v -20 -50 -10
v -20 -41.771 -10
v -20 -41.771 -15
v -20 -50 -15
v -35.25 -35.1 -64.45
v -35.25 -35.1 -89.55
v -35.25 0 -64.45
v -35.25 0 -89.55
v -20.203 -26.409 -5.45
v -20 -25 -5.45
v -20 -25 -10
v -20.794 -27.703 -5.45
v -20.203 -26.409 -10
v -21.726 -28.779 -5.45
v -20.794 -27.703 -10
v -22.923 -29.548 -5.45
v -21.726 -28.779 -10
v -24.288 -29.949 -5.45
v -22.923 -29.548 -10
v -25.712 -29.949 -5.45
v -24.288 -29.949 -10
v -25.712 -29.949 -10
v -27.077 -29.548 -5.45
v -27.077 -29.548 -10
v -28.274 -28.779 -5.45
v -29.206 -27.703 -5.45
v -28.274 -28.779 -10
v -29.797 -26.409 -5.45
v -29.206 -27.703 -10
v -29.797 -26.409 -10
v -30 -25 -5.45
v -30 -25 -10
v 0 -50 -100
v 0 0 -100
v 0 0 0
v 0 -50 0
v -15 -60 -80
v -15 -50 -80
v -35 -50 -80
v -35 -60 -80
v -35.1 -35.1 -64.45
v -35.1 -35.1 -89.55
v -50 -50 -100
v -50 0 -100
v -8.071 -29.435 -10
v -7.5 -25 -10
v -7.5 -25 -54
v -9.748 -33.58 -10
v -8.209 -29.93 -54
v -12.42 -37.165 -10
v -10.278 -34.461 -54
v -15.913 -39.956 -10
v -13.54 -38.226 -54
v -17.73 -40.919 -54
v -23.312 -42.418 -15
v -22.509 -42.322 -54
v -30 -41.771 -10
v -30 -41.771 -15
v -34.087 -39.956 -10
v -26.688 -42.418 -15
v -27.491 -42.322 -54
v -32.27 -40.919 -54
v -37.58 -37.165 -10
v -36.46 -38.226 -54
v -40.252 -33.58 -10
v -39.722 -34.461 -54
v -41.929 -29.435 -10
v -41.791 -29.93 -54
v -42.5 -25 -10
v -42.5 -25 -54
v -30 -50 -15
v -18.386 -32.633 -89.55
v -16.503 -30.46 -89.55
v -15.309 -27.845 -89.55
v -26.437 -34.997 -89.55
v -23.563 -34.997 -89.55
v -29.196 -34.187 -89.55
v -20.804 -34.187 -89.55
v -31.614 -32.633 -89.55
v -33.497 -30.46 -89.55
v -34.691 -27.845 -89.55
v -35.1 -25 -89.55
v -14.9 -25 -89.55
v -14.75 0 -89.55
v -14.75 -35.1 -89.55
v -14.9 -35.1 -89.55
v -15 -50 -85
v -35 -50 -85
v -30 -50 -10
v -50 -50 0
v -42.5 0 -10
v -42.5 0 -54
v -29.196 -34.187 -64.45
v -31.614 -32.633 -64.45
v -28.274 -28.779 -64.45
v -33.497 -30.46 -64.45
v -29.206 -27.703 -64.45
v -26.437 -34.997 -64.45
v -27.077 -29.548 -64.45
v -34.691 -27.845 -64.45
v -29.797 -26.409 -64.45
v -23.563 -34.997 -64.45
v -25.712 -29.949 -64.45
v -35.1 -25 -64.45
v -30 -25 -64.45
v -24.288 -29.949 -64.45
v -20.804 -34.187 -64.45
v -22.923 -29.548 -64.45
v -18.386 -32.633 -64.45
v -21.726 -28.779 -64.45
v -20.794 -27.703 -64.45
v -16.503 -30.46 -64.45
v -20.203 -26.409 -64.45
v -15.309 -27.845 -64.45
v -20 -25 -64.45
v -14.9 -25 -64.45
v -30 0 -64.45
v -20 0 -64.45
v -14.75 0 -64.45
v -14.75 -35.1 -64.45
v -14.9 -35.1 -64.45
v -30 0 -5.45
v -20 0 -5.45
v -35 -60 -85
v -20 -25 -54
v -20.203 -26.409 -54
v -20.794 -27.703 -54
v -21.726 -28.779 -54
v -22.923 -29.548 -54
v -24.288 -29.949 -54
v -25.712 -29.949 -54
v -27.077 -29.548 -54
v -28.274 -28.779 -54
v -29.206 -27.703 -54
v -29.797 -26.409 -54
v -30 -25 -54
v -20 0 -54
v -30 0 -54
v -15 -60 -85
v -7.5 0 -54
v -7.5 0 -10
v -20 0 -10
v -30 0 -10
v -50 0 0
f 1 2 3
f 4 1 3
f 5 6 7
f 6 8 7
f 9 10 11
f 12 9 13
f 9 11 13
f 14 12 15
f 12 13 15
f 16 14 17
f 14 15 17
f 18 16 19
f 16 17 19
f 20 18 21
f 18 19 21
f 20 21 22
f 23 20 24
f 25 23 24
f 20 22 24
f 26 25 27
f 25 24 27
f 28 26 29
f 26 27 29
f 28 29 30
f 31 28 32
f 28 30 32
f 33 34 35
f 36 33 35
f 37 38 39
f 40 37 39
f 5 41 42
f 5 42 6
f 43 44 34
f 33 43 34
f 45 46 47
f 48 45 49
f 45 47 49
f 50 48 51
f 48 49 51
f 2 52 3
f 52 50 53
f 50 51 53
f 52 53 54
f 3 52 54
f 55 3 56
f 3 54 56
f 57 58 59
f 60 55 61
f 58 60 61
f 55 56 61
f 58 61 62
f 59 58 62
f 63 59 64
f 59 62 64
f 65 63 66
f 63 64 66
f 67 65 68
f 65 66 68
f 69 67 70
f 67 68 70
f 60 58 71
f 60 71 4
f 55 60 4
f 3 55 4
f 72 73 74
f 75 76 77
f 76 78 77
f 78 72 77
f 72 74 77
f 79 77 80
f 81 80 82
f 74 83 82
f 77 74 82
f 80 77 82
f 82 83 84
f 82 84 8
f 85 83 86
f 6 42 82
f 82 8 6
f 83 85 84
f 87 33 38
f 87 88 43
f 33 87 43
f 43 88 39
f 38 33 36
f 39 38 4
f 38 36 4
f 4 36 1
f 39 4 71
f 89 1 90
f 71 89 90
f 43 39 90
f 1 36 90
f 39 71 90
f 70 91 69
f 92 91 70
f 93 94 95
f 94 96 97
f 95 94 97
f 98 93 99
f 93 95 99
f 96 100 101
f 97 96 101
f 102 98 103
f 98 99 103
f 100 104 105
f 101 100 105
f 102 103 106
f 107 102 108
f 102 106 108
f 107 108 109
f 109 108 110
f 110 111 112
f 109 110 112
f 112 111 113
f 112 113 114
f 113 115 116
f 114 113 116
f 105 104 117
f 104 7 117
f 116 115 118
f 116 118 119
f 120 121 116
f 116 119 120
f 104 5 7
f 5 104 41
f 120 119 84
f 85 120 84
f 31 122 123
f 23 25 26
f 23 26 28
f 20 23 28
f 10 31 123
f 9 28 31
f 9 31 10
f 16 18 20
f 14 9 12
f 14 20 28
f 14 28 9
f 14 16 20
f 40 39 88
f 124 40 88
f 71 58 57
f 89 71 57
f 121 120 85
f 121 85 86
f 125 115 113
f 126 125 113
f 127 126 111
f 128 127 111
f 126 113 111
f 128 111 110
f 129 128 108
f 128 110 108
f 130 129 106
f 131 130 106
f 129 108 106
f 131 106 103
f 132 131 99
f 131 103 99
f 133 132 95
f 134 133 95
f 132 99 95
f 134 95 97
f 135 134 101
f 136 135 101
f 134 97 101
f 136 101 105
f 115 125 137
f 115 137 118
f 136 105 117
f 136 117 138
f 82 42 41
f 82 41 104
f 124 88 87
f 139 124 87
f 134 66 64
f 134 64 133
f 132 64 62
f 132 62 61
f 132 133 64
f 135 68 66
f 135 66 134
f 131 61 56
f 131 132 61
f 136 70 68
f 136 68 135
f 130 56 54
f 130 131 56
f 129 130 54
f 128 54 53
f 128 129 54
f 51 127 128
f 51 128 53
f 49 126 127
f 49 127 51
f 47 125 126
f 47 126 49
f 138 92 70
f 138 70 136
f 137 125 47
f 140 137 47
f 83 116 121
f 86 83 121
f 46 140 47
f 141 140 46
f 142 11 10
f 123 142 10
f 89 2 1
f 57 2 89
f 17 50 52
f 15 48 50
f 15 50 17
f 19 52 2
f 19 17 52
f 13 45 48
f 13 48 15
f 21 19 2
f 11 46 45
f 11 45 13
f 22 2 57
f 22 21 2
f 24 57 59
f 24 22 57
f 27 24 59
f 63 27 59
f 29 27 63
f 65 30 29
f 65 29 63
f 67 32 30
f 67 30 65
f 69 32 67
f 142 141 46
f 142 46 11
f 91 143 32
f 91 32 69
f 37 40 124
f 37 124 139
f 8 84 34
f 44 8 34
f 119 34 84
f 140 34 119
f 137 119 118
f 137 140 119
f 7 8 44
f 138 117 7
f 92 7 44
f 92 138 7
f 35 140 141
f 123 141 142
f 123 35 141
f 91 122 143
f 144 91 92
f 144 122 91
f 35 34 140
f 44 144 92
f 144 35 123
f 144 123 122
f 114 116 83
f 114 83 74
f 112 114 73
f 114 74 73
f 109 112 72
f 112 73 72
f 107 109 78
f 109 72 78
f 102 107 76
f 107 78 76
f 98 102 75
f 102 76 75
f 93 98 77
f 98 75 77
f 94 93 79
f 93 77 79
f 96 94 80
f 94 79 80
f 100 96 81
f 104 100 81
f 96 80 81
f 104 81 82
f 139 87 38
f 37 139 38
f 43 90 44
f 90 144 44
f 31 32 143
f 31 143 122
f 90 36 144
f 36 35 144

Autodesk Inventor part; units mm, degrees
sketch "Sketch1" plane through (0, 0, 0) normal (0, 1, 0) x (-1, 0, 0)
  line L0 (0, 0) -> (50, 0)
  line L1 (50, 0) -> (50, -100)
  line L2 (50, -100) -> (0, -100)
  line L3 (0, -100) -> (0, 0)
  line L4 (25, 0) -> (25, -100)
  line L5 (7.5, -54) -> (7.5, -10)
  line L6 (7.5, -10) -> (42.5, -10)
  line L7 (42.5, -10) -> (42.5, -54)
  line L8 (42.5, -54) -> (7.5, -54)
  line L9 (7.5, -54) -> (42.5, -10) construction
  line L10 (7.5, -10) -> (42.5, -54) construction
  line L11 (7.5, -54) -> (51.5, -54) construction
  line L12 (14.75, -64.45) -> (14.75, -89.55)
  line L13 (14.75, -89.55) -> (35.25, -89.55)
  line L14 (35.25, -89.55) -> (35.25, -64.45)
  line L15 (35.25, -64.45) -> (14.75, -64.45)
  line L16 (14.75, -64.45) -> (35.25, -89.55) construction
  line L17 (14.75, -89.55) -> (35.25, -64.45) construction
  line L18 (14.75, -64.45) -> (39.85, -64.45) construction
  line L19 (25, -10) -> (25, -15)
  line L20 (25, -10) -> (30, -10) construction
  line L21 (20, -20) -> (30, -20)
  line L22 (30, -20) -> (30, -10)
  line L23 (30, -10) -> (20, -10)
  line L24 (20, -10) -> (20, -20)
  line L25 (20, -20) -> (30, -10) construction
  line L26 (30, -20) -> (20, -10) construction
  line L27 (20, -20) -> (30, -20) construction
  line L28 (30, -15) -> (20, -15)
  point P0 (25, -32)
  point P1 (25, -77)
  point P2 (25, -54)
  point P3 (25, -77)
  dimension "d0" = 50
  dimension "d1" = 100
  dimension "d4" = 44
  dimension "d5" = 90
  dimension "d6" = 35
  dimension "d7" = 10
  dimension "d8" = 25.1
  dimension "d9" = 90
  dimension "d10" = 20.5
  dimension "d35" = 5
  dimension "d36" = 90
  dimension "d37" = 0
extrude "Extrusion1" add sketch "Sketch1" against normal blind 50
ref_plane "Work Plane3" through (-14.75, 0, -89.55) normal (0, 0, -1) x (-1, 0, 0)
ref_plane "Work Plane4" through (-7.5, 0, -54) normal (0, 0, -1) x (-1, 0, 0)
sketch "Sketch3" plane through (-14.75, 0, -89.55) normal (0, 0, -1) x (-1, 0, 0)
  line L0 (35.25, 0) -> (-14.75, 0) projected
  line L1 (35.25, 0) -> (35.25, -50) projected
  line L2 (-14.75, -50) -> (35.25, -50) projected
  line L3 (-14.75, 0) -> (-14.75, -50) projected
  circle A0 centre (10.25, -25) radius 10.1
  line L4 (20.35, -35.1) -> (20.35, -14.9)
  line L5 (20.35, -14.9) -> (0.15, -14.9)
  line L6 (0.15, -14.9) -> (0.15, -35.1)
  line L7 (0.15, -35.1) -> (20.35, -35.1)
  line L8 (20.35, -35.1) -> (0.15, -14.9) construction
  line L9 (20.35, -14.9) -> (0.15, -35.1) construction
  line L10 (20.35, -35.1) -> (40.55, -35.1) construction
  point P0 (10.25, -35.1)
  point P1 (0.15, -25)
  point P2 (20.35, -25)
  dimension "d18" = 20.2
  dimension "d21" = 90
ref_plane "Work Plane5" through (-14.75, 0, -64.45) normal (0, 0, -1) x (-1, 0, 0)
ref_plane "Work Plane6" through (-7.5, 0, -10) normal (0, 0, -1) x (-1, 0, 0)
ref_plane "Work Plane7" through (-35.1, -35.1, -89.55) normal (0, 1, 0) x (1, 0, 0)
extrude "Extrusion5" cut sketch "Sketch1" against normal up to surface (35.1 mm away) contours L13 L12 L15 L4 | L4 L15 L14 L13
extrude "Extrusion6" add sketch "Sketch3" against normal up to surface (25.1 mm away) contours L4 L7 A0 | L7 L6 A0
sketch "Sketch4" plane through (-7.5, 0, -54) normal (0, 0, -1) x (-1, 0, 0)
  line L0 (42.5, 0) -> (-7.5, 0) projected
  line L1 (42.5, 0) -> (42.5, -50) projected
  line L2 (-7.5, -50) -> (42.5, -50) projected
  line L3 (-7.5, 0) -> (-7.5, -50) projected
  circle A0 centre (17.5, -25) radius 17.5
  line L4 (0, -42.5) -> (0, -7.5)
  line L5 (0, -7.5) -> (35, -7.5)
  line L6 (35, -7.5) -> (35, -42.5)
  line L7 (35, -42.5) -> (0, -42.5)
  line L8 (0, -42.5) -> (35, -7.5) construction
  line L9 (0, -7.5) -> (35, -42.5) construction
  line L10 (0, -42.5) -> (35, -42.5) construction
  point P0 (17.5, -42.5)
  point P1 (35, -25)
  point P2 (0, -25)
  dimension "d26" = 35
  dimension "d27" = 90
ref_plane "Work Plane8" through (-7.5, -42.5, -54) normal (0, 1, 0) x (1, 0, 0)
extrude "Extrusion7" cut sketch "Sketch1" against normal up to surface (42.5 mm away) contours L6 L22 L28 L4 | L4 L28 L24 L6 | L28 L22 L21 L4 | L4 L21 L24 L28 | L24 L21 L4 L8 L5 L6 | L6 L7 L8 L4 L21 L22
extrude "Extrusion8" add sketch "Sketch4" against normal up to surface (44 mm away) contours L6 L7 A0 | L7 L4 A0
sketch "Sketch5" plane through (-14.75, 0, -64.45) normal (0, 0, -1) x (-1, 0, 0)
  line L0 (35.25, 0) -> (-14.75, 0) projected
  line L1 (35.25, 0) -> (35.25, -50) projected
  line L2 (-14.75, -50) -> (35.25, -50) projected
  line L3 (-14.75, 0) -> (-14.75, -50) projected
  circle A0 centre (10.25, -25) radius 5
  dimension "d32" = 10
extrude "Extrusion9" cut sketch "Sketch5" against normal blind 59 contours A0
extrude "Extrusion10" cut sketch "Sketch1" against normal through all contours L6 L22 L28 L4 | L4 L28 L24 L6
ref_plane "Work Plane9" through (-25, -25, -64.45) normal (0, 1, 0) x (1, 0, 0)
sketch "Sketch6" plane through (-25, -25, -64.45) normal (0, 1, 0) x (1, 0, 0)
  line L0 (-5, 0) -> (-5, -10.45) projected
  line L1 (-5, 0) -> (5, 0) projected
  line L2 (5, -10.45) -> (-5, -10.45) projected
  line L3 (5, -10.45) -> (-5, -10.45) projected
  line L4 (-5, -10.45) -> (5, -10.45)
  line L5 (5, -10.45) -> (5, 0)
  line L6 (5, 0) -> (-5, 0)
  line L7 (-5, 0) -> (-5, -10.45)
  line L8 (-5, -59) -> (5, -59) projected
  line L9 (-5, -54.45) -> (-5, -59) projected
  line L10 (5, -54.45) -> (5, -59) projected
  line L11 (-5, -54.45) -> (5, -54.45) projected
  line L12 (5, -54.45) -> (-5, -54.45)
  line L13 (-5, -54.45) -> (-5, -59)
  line L14 (-5, -59) -> (5, -59)
  line L15 (5, -59) -> (5, -54.45)
  point P0 (25, -64.45)
extrude "Extrusion11" cut sketch "Sketch6" along normal through all
sketch "Sketch7" plane through (0, -50, 0) normal (0, -1, 0) x (1, 0, 0)
  line L0 (-50, -100) -> (0, -100) projected
  line L1 (-25, -100) -> (-25, -80)
  line L2 (-25, -80) -> (-35, -80)
  line L3 (-35, -80) -> (-35, -85)
  line L4 (-35, -85) -> (-25, -85)
  line L5 (-25, -85) -> (-25, -80)
  line L6 (-35, -85) -> (-15, -85)
  line L7 (-15, -85) -> (-15, -80)
  line L8 (-15, -80) -> (-35, -80)
  line L9 (-35, -80) -> (-35, -85)
  point P0 (0, 0)
  dimension "d42" = 20
  dimension "d43" = 10
  dimension "d44" = 5
  dimension "d45" = 20
extrude "Extrusion12" add sketch "Sketch7" along normal blind 10
properties part number "dcmotor_housing"
